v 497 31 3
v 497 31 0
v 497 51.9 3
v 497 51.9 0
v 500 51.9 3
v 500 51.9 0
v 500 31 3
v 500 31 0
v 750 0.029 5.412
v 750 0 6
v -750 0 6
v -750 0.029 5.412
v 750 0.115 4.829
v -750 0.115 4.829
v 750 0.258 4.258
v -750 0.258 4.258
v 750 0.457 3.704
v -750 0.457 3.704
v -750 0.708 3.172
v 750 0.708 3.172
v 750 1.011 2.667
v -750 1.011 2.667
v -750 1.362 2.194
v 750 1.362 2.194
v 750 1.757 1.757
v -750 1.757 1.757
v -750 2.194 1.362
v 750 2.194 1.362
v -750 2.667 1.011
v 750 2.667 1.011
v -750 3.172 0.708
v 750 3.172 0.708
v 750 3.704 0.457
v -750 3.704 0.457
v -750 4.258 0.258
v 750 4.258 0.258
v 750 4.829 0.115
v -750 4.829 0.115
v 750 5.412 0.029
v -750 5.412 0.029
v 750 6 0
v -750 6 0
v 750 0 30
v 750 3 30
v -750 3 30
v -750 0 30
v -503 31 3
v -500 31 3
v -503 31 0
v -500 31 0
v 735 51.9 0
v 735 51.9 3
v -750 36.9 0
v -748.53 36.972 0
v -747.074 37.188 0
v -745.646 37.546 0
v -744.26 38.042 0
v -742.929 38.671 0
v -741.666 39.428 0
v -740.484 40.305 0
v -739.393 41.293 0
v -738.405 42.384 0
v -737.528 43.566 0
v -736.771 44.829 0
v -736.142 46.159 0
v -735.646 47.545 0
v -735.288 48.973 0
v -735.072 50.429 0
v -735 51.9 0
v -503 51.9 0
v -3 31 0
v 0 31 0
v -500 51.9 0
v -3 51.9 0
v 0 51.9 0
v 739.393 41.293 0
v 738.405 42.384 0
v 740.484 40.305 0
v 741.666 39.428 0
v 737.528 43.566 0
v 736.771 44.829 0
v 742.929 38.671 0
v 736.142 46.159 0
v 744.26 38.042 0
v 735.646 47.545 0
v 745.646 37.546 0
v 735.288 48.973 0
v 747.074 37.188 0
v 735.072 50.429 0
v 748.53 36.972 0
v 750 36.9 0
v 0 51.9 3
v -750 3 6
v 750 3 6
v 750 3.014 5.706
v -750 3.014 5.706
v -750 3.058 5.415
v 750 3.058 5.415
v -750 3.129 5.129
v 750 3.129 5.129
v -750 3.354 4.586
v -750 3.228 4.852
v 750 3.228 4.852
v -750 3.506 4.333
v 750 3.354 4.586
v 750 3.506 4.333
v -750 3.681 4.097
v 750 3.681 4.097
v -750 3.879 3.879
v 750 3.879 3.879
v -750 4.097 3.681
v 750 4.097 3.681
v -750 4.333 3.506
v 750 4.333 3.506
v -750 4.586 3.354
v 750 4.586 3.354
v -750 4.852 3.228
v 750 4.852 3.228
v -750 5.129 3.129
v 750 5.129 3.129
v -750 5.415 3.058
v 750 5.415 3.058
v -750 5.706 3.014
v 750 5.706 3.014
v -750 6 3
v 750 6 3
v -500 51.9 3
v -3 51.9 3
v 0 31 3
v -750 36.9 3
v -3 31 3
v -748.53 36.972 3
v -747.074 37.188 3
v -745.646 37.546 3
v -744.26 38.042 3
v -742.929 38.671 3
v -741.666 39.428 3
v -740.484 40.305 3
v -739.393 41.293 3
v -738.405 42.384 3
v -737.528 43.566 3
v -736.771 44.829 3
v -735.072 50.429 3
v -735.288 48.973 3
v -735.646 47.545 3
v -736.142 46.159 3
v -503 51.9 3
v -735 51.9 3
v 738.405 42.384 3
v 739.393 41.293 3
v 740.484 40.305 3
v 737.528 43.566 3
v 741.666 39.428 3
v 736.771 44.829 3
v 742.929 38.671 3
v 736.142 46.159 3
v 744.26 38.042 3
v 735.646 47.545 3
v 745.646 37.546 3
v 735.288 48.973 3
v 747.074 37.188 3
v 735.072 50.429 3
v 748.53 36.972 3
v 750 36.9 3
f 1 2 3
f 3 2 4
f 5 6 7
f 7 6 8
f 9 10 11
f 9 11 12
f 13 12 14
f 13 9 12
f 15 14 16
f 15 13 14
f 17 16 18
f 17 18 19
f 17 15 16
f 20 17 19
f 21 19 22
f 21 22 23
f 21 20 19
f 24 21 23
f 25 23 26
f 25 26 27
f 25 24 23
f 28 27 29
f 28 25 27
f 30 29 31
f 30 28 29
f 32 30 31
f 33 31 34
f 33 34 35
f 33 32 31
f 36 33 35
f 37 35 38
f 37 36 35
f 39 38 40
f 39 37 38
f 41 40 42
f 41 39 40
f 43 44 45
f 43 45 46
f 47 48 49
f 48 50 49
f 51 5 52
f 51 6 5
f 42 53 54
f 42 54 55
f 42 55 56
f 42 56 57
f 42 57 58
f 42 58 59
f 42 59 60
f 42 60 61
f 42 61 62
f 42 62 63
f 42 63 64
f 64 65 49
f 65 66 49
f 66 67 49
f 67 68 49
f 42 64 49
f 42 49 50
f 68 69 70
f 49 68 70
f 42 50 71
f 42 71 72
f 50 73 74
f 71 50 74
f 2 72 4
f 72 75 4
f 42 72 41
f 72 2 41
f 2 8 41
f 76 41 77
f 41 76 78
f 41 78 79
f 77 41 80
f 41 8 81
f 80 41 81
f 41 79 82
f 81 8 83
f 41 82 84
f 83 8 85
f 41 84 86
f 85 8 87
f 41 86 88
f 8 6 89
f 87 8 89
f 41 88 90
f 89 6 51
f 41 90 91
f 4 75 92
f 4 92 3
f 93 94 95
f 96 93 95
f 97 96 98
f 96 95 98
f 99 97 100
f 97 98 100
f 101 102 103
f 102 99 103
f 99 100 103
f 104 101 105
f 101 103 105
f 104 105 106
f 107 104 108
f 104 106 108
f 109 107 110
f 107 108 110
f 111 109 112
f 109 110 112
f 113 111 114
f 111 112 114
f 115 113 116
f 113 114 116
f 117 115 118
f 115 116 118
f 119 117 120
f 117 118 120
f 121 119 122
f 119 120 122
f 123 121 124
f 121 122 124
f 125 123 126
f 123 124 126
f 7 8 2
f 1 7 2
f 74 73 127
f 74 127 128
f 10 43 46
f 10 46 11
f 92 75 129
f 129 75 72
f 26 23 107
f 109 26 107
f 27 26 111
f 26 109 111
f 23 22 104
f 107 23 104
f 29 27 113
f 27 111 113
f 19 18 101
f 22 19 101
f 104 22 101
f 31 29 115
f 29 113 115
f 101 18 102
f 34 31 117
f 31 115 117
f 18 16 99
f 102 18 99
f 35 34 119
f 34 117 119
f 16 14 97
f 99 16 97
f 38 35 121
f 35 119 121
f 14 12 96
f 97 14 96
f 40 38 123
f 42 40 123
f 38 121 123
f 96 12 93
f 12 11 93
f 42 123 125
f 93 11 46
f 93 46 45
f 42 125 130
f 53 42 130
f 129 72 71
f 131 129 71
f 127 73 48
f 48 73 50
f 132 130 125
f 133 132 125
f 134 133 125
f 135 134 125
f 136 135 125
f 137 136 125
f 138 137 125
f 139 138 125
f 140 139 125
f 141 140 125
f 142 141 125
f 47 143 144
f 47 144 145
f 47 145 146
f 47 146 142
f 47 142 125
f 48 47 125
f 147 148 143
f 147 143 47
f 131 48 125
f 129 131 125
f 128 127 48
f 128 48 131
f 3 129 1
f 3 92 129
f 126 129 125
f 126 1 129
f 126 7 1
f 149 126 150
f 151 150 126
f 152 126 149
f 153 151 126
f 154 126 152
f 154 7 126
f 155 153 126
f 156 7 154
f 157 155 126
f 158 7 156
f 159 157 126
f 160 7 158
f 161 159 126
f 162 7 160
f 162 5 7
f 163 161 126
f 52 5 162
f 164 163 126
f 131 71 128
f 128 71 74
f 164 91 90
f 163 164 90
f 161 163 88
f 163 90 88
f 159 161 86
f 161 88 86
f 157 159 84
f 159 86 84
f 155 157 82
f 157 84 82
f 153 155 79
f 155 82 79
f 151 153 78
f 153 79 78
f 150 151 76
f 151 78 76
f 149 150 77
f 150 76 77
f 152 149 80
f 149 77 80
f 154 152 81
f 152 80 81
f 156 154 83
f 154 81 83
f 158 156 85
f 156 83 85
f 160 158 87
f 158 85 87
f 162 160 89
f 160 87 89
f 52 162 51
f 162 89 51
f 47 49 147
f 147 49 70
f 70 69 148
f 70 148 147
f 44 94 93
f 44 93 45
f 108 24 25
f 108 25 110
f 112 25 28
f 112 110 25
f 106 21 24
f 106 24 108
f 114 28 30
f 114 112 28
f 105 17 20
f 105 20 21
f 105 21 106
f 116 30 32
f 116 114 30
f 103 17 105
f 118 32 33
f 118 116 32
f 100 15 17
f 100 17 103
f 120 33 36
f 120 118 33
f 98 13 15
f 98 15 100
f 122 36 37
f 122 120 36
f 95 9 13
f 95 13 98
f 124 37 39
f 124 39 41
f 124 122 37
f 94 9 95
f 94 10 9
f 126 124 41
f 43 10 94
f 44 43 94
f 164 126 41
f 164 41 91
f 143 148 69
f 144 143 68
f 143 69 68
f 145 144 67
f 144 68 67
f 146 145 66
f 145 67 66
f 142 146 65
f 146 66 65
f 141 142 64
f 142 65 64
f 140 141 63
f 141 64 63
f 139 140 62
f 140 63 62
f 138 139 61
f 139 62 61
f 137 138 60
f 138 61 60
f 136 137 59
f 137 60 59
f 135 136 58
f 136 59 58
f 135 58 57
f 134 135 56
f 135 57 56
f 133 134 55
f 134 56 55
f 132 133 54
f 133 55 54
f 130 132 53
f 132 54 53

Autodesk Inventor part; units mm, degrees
ref_plane "YZ Plane" through (0, 0, 0) normal (1, 0, 0) x (0, 1, 0)
ref_plane "XZ Plane" through (0, 0, 0) normal (0, 1, 0) x (-1, 0, 0)
ref_plane "XY Plane" through (0, 0, 0) normal (0, 0, 1) x (1, 0, 0)
sketch "Sketch1" plane through (0, 0, 0) normal (0, 0, 1) x (1, 0, 0)
  line L0 (-750, 51.8997) -> (750, 51.8997)
  line L1 (750, 51.8997) -> (750, 0)
  line L2 (750, 0) -> (-750, 0)
  line L3 (-750, 0) -> (-750, 51.8997)
  point P0 (0, 0)
  point P1 (0, 0)
  dimension "d0" = 1500
  dimension "d1" = 51.8997
extrude "Plate1" add sketch "Sketch1" along normal blind 3
sketch "Sketch2" plane through (750, 3, 0) normal (0, -1, 0) x (1, 0, 0)
  line L0 (-1500, 0) -> (0, 0)
  line L1 (0, 0) -> (0, 30)
  line L2 (0, 30) -> (-1500, 30)
  line L3 (-1500, 30) -> (-1500, 0)
edge flange "Flange1" height 30 angle 90 thickness 3 bend radius 3 thickness toward (0, -1, 0) relief tear relief width 3 relief depth 1.5 edges at (0, 0, 3) wall of the first edge with corners at (-750, 3, 0) (750, 3, 0) (750, 3, 30) (-750, 3, 30)
bend "Bend1"
corner "Corner1"
sketch "Sketch5" plane through (0, 0, 0) normal (0, 0, -1) x (-1, 0, 0)
  line L0 (750, 51.8997) -> (-750, 51.8997) projected
  line L1 (500, 51.8997) -> (500, 31)
  line L2 (500, 31) -> (503, 31)
  line L3 (503, 31) -> (503, 51.8997)
  line L4 (750, 0) -> (-750, 0) projected
  point P0 (0, 0)
  dimension "d18" = 3
  dimension "d19" = 247
  dimension "d20" = 31
extrude "Extrusion1" cut sketch "Sketch5" against normal through all
pattern_linear "Rectangular Pattern1" count 3 spacing 500 along (1, 0, 0) of "Extrusion1"
sketch "Sketch6" plane through (0, 0, 0) normal (0, 0, -1) x (-1, 0, 0)
  line L0 (-750, 51.8997) -> (-750, 6) projected
  circle A0 centre (-750, 51.8997) radius 15
  line L1 (-750, 51.8997) -> (-500, 51.8997) projected
  point P0 (0, 0)
  point P1 (-735, 51.8997)
  point P2 (-750, 36.8997)
  dimension "d24" = 30
extrude "Extrusion2" cut sketch "Sketch6" against normal through all contours L1 A0 L0 picked at (-740.1254, 50.7871)
mirror "Mirror1" about plane through (0, 0, 0) normal (1, 0, 0) of "Extrusion2"
equation "\"d1\" = Стрингер_5"
equation "\"d18\" = Thickness"
equation "\"d2\" = Thickness"
equation "\"d3\" = BendReliefWidth"
equation "\"d4\" = BendReliefDepth"
equation "\"d5\" = MinimumRemnant"
equation "\"d6\" = TransitionRadius"
equation "\"d9\" = BendRadius"
equation "\"d10\" = CornerReliefSize"
equation "\"d11\" = GapSize"
equation "\"d12\" = JacobiRadiusSize"
equation "\"BendRadius\" = Thickness"
equation "\"BendReliefWidth\" = Thickness"
equation "\"BendReliefDepth\" = 0.5 * Thickness"
equation "\"CornerReliefSize\" = 4 * Thickness"
equation "\"MinimumRemnant\" = 2 * Thickness"
equation "\"TransitionRadius\" = BendRadius"
equation "\"JacobiRadiusSize\" = BendRadius"
equation "\"GapSize\" = Thickness"
equation "\"Стрингер_5\" = 51.899679"
equation "\"Thickness\" = 3"
properties part number "МОО 055 стрингер борт 51"
